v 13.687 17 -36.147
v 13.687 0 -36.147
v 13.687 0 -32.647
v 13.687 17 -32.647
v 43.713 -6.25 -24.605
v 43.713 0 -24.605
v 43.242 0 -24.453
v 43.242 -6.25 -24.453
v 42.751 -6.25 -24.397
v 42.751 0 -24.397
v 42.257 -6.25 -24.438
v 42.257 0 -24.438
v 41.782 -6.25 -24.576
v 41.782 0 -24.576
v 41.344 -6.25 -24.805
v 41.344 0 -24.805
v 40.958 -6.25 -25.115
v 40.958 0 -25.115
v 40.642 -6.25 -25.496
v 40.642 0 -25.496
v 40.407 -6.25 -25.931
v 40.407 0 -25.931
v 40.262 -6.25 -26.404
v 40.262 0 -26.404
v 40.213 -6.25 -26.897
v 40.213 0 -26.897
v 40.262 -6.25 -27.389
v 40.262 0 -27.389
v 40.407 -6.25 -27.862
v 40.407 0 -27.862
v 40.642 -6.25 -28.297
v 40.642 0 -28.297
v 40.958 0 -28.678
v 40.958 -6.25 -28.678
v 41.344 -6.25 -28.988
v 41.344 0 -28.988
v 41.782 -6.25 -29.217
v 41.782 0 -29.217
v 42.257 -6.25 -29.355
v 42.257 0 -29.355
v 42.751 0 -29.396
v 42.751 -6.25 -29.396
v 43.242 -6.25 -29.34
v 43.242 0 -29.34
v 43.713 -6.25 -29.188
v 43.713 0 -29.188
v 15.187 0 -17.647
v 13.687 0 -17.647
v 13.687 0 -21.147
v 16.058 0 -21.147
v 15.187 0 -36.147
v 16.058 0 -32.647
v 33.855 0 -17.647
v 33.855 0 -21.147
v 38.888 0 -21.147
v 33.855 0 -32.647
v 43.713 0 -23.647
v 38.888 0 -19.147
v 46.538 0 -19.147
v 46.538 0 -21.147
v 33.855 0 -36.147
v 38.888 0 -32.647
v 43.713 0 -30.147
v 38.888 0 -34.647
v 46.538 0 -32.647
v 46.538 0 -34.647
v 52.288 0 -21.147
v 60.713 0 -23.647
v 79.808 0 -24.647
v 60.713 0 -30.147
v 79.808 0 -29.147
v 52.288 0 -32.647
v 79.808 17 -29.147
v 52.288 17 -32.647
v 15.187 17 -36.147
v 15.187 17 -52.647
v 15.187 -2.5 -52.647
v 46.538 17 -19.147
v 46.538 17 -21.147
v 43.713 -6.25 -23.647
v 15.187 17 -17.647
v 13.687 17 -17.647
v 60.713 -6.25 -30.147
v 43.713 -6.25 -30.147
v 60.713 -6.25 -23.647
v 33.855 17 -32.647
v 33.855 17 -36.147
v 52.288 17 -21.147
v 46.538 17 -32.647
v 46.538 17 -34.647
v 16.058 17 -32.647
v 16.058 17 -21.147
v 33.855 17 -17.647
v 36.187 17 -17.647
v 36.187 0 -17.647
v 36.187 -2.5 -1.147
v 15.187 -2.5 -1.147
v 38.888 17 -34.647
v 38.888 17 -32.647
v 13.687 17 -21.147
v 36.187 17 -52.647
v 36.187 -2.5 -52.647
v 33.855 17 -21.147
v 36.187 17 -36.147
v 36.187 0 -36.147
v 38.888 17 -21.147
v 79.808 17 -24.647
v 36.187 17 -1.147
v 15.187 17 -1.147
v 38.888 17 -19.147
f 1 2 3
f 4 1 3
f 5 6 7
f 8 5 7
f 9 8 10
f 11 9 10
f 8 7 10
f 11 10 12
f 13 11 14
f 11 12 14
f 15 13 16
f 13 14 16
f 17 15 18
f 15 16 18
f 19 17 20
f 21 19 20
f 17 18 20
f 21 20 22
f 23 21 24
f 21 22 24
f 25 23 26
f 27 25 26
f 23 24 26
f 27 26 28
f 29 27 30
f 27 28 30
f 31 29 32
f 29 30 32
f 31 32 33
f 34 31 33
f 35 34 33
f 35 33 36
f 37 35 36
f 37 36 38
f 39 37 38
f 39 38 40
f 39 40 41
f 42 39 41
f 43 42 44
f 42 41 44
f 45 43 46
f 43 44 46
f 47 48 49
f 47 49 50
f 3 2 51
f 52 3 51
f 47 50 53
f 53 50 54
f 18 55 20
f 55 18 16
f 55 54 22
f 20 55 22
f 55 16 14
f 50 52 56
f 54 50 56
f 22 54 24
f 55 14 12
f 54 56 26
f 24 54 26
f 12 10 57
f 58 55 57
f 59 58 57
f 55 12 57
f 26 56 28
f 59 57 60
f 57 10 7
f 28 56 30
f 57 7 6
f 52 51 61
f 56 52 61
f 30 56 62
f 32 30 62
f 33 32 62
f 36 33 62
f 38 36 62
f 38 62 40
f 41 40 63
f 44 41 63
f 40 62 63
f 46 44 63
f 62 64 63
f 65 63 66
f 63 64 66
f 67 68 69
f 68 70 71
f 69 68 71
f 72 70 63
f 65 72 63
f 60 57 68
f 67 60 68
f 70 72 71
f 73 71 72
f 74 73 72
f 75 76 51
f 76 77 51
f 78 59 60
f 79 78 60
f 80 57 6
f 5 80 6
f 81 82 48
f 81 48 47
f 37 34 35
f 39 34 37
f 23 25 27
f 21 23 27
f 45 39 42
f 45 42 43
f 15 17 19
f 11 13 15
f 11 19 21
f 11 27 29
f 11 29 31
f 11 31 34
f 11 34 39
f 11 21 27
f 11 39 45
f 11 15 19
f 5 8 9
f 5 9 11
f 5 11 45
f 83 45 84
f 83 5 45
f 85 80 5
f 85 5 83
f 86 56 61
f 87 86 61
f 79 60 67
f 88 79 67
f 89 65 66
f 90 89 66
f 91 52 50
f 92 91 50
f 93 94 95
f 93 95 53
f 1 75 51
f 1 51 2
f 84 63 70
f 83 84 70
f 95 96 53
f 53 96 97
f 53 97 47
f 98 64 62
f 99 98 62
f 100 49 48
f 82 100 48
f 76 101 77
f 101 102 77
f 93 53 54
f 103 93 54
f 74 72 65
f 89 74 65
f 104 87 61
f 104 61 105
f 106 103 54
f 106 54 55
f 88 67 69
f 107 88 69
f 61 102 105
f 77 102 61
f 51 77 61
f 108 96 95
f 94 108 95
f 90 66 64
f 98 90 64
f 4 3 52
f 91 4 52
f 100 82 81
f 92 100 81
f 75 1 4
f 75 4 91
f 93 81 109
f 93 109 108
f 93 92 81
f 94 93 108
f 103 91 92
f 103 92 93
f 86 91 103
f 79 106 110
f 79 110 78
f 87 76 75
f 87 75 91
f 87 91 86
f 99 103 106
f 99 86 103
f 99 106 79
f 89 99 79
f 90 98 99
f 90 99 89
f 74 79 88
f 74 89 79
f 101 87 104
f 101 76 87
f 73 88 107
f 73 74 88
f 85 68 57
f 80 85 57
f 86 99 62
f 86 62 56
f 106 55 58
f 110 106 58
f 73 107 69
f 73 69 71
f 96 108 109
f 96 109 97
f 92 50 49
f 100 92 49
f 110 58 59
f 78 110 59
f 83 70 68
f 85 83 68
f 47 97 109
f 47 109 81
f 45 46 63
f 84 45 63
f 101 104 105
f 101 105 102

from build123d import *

# Parameters (mm, degrees)
BOSS_EXTRUDE1_DEPTH = 17
BOSS_EXTRUDE2_DEPTH = 6.25
BOSS_EXTRUDE3_DEPTH = 21


with BuildPart() as part:
    # Sketch1 → Boss-Extrude1 (new body)
    with BuildSketch(Plane(origin=(0, 0, 0), x_dir=(1, 0, 0), z_dir=(0, 1, 0))):
        Polygon((38.887869235, 32.64650928), (33.855356453, 32.64650928), (33.855356453, 36.14650928), (36.187130568, 36.14650928), (36.187130568, 52.64650928), (15.187130568, 52.64650928), (15.187130568, 36.14650928), (13.687130568, 36.14650928), (13.687130568, 32.64650928), (16.05811547, 32.64650928), (16.05811547, 21.14650928), (13.687130568, 21.14650928), (13.687130568, 17.64650928), (15.187130568, 17.64650928), (15.187130568, 1.14650928), (36.187130568, 1.14650928), (36.187130568, 17.64650928), (33.855356453, 17.64650928), (33.855356453, 21.14650928), (38.887869235, 21.14650928), (38.887869235, 19.14650928), (46.537869235, 19.14650928), (46.537869235, 21.14650928), (52.287869235, 21.14650928), (79.808081842, 24.64650928), (79.808081842, 29.14650928), (52.287869235, 32.64650928), (46.537869235, 32.64650928), (46.537869235, 34.64650928), (38.887869235, 34.64650928), align=None)
    extrude(amount=BOSS_EXTRUDE1_DEPTH)

    # Sketch2 → Boss-Extrude2 (add)
    with BuildSketch(Plane.XZ):
        with BuildLine():
            Line((43.712869235, -29.187797128), (43.712869235, -30.14650928))
            Line((43.712869235, -30.14650928), (45.212869235, -30.14650928))
            Line((45.212869235, -30.14650928), (60.712869235, -30.14650928))
            Line((60.712869235, -30.14650928), (60.712869235, -26.89650928))
            Line((60.712869235, -26.89650928), (60.712869235, -23.64650928))
            Line((60.712869235, -23.64650928), (45.212869235, -23.64650928))
            Line((45.212869235, -23.64650928), (43.712869235, -23.64650928))
            Line((43.712869235, -23.64650928), (43.712869235, -24.605221433))
            ThreePointArc((43.712869235, -24.605221433), (40.212869235, -26.89650928), (43.712869235, -29.187797128))
        make_face()
    extrude(amount=BOSS_EXTRUDE2_DEPTH)

    # Sketch3 → Boss-Extrude3 (add)
    with BuildSketch(Plane.ZY.offset(-15.187130568)):
        Polygon((-1.14650928, 0), (-1.14650928, -2.5), (-17.64650928, 0), align=None)
        Polygon((-36.14650928, 0), (-52.64650928, 0), (-52.64650928, -2.5), align=None)
    extrude(amount=-BOSS_EXTRUDE3_DEPTH)


solid = part.part
